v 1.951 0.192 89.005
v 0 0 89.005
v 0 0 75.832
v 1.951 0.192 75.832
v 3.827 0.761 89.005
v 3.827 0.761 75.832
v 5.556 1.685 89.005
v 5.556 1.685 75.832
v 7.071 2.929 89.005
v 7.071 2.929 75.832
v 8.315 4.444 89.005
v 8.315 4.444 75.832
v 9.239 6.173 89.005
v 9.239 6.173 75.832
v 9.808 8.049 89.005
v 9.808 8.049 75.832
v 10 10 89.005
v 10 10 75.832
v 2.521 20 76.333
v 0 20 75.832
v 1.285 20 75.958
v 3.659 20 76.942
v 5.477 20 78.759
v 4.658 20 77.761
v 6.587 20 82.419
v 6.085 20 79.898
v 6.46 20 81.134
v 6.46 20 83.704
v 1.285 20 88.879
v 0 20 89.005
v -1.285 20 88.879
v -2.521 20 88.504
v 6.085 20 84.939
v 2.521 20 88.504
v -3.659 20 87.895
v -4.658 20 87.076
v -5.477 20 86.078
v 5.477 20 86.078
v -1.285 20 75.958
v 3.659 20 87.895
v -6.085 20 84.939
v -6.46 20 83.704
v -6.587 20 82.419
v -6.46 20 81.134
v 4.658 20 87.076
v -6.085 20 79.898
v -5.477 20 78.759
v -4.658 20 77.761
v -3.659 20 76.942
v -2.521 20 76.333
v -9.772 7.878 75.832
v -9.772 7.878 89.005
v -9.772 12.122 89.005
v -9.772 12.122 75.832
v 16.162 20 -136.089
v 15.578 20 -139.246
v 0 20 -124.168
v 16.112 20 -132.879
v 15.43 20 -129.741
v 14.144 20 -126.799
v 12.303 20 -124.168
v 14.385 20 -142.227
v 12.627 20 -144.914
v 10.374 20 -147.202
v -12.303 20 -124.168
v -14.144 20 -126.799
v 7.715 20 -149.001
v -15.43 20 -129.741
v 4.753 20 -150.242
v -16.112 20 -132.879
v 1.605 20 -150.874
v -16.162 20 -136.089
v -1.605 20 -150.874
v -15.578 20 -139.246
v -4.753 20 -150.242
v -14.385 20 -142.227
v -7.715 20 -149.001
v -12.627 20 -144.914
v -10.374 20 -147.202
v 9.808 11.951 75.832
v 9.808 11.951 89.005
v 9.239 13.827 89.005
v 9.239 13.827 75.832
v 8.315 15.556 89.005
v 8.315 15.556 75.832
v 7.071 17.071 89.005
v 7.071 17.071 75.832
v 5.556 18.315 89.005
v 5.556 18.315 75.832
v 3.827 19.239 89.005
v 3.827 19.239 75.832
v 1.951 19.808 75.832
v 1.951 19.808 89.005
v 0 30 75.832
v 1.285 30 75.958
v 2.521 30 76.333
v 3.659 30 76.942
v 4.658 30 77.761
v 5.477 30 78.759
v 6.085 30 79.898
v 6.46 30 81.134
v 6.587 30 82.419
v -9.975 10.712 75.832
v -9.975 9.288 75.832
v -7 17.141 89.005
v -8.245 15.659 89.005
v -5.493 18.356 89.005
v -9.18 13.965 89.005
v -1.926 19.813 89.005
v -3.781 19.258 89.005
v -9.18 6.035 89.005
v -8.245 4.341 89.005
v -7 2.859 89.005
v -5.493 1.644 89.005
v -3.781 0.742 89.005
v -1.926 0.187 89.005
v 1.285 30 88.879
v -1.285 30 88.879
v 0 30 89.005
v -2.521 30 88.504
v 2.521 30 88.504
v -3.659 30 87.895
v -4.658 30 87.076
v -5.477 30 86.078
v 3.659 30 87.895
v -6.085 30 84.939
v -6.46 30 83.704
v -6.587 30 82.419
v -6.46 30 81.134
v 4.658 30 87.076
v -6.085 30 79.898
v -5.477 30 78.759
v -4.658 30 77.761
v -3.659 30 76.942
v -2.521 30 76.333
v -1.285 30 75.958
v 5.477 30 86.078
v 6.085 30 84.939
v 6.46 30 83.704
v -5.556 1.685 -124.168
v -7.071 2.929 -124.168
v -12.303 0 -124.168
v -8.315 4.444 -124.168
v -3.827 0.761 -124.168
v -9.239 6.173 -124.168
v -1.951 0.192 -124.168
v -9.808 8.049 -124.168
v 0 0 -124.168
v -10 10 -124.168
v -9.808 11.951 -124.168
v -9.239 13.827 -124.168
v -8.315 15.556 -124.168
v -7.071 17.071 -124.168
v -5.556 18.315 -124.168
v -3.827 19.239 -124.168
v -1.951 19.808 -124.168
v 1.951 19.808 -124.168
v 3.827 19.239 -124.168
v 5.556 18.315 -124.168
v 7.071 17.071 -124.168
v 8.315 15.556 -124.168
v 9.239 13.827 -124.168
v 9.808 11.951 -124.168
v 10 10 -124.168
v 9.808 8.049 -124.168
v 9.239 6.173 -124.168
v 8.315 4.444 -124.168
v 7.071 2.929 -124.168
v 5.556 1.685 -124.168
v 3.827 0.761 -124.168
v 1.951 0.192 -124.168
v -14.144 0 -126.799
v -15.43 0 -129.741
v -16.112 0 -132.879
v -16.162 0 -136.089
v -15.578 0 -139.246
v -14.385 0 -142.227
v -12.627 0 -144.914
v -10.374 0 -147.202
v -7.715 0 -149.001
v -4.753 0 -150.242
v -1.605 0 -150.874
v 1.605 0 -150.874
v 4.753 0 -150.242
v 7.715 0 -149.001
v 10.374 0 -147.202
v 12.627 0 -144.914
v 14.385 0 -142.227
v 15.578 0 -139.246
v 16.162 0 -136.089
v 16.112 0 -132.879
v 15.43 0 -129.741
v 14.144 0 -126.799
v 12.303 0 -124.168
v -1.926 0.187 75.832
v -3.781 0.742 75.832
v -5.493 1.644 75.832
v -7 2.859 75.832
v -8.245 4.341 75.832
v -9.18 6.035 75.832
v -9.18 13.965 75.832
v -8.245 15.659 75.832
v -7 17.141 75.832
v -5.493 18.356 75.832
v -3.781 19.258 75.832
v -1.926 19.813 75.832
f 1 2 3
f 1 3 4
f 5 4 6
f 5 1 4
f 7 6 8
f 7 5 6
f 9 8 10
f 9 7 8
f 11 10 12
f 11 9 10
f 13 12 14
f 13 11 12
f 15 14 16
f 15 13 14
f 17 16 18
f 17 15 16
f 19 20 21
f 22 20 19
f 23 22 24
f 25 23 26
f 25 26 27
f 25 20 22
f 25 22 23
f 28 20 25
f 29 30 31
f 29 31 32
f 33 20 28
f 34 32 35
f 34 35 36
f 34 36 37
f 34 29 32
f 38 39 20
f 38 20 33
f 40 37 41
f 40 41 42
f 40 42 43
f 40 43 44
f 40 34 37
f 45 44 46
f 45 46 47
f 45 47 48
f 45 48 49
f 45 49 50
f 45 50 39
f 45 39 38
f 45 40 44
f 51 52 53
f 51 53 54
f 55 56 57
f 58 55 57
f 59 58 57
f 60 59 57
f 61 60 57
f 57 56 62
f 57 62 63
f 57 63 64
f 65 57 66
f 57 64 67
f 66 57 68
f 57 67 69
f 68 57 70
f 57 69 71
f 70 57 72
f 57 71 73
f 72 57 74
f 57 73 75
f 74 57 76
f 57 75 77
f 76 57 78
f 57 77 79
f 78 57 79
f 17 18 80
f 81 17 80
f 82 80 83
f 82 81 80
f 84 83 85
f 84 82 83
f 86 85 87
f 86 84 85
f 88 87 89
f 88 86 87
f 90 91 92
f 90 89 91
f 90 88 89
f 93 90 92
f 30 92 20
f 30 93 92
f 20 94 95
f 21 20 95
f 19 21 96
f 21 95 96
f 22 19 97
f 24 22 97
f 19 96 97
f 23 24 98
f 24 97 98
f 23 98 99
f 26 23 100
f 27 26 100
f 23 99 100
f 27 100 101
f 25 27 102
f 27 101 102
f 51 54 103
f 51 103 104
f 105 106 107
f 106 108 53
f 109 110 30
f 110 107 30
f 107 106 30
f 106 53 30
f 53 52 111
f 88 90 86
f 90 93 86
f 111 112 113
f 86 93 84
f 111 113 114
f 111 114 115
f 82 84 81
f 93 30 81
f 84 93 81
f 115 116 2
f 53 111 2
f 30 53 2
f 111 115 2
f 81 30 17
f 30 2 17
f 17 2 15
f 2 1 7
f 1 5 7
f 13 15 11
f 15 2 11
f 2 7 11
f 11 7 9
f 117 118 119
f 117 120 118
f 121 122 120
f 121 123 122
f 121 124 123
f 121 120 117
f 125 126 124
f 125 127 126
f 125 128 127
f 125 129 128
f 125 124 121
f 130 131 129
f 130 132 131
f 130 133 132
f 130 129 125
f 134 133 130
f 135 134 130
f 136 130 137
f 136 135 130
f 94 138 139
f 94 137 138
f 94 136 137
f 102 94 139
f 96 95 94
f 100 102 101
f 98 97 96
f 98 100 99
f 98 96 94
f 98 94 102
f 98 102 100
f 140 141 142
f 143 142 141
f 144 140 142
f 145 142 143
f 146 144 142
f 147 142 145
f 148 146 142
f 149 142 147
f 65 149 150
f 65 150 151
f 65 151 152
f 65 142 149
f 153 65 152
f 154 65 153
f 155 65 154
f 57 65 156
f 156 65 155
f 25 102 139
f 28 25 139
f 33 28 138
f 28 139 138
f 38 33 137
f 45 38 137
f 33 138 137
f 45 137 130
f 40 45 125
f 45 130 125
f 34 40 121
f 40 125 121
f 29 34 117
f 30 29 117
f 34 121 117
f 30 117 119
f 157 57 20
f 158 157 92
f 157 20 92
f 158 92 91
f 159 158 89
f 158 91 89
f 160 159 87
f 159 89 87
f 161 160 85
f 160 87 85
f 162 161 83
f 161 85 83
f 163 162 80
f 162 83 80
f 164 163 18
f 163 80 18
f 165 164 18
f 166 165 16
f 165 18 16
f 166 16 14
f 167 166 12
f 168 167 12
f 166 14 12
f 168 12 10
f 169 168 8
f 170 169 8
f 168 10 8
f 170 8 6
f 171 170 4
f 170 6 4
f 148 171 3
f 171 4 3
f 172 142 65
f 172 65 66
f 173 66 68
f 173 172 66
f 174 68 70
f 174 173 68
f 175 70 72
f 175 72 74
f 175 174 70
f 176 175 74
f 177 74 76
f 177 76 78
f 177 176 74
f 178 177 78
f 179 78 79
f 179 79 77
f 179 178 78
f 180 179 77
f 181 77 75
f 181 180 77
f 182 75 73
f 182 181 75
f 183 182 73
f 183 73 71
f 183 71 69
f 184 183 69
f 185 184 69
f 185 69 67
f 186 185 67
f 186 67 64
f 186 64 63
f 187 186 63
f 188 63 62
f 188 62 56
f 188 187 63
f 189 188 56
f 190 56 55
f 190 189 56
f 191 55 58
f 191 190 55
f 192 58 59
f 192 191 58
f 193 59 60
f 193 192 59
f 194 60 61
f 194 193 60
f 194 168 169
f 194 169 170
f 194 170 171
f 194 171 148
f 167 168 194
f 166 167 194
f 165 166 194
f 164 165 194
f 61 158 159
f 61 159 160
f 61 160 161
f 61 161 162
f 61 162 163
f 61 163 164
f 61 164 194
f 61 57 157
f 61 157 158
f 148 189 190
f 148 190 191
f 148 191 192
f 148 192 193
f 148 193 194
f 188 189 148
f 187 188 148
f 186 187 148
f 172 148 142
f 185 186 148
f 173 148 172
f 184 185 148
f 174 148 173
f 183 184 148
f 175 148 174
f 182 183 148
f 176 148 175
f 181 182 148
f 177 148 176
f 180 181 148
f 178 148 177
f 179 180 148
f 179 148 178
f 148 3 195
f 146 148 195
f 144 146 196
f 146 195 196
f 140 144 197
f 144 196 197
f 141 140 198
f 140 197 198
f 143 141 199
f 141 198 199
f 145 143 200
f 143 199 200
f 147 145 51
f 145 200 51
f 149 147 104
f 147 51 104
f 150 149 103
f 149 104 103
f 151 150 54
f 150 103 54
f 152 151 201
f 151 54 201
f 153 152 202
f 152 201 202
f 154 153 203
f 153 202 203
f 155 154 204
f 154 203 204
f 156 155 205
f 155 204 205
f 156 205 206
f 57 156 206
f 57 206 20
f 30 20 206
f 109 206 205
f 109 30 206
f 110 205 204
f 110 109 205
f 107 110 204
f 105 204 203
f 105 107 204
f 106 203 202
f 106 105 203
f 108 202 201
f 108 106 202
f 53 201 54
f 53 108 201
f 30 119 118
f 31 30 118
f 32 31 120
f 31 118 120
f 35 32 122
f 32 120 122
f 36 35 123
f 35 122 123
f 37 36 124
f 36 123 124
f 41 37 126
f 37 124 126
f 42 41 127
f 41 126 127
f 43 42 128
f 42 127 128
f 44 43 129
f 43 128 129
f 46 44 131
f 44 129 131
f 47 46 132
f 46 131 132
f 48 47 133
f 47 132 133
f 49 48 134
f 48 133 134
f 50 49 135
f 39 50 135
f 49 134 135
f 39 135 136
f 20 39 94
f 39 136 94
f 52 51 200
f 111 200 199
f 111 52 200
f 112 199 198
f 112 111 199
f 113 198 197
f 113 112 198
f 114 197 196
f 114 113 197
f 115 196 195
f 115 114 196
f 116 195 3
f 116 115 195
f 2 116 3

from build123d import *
from build123d.topology import SkipClean

# Parameters (mm, degrees)
BOSS_EXTRUDE1_DEPTH = 20
CUT_EXTRUDE3_DEPTH  = 200
SKETCH5_W           = 19.772216907
SKETCH5_H           = 13.173491176
BOSS_EXTRUDE2_DEPTH = 30
CUT_EXTRUDE6_DEPTH  = 10
CUT_EXTRUDE8_START  = -34
CUT_EXTRUDE8_DEPTH  = 34


with BuildPart() as part:
    # Sketch1 → Boss-Extrude1 (new body)
    with BuildSketch(Plane(origin=(0, 0, 0), x_dir=(1, 0, 0), z_dir=(0, 1, 0))):
        with BuildLine():
            Line((12.303213462, -75.831786225), (-12.303213462, -75.831786225))
            Line((-12.303213462, -75.831786225), (-12.303213462, 124.168213775))
            ThreePointArc((-12.303213462, 124.168213775), (0, 150.953919879), (12.303213462, 124.168213775))
            Line((12.303213462, 124.168213775), (12.303213462, -75.831786225))
        make_face()
    extrude(amount=BOSS_EXTRUDE1_DEPTH)

    # Sketch3 → Cut-Extrude3 (cut)
    with BuildSketch(Plane.XY.offset(75.831786225)):
        with BuildLine():
            Line((5e-09, 0), (12.303213462, 0))
            Line((12.303213462, 0), (12.303213462, 20))
            Line((12.303213462, 20), (5.3e-08, 20))
            ThreePointArc((5.3e-08, 20), (10, 9.999999976), (5e-09, 0))
        make_face()
        with BuildLine():
            Line((-12.303213462, 0), (5e-09, 0))
            ThreePointArc((5e-09, 0), (-10, 10.000000024), (5.3e-08, 20))
            Line((5.3e-08, 20), (-12.303213462, 20))
            Line((-12.303213462, 20), (-12.303213462, 0))
        make_face()
    extrude(amount=-CUT_EXTRUDE3_DEPTH, mode=Mode.SUBTRACT)

    # Sketch5 → Boss-Extrude2 (add)
    with BuildSketch(Plane(origin=(0, 0, 0), x_dir=(1, 0, 0), z_dir=(0, 1, 0))):
        with Locations((0.113891546, -82.418531813)):
            Rectangle(SKETCH5_W, SKETCH5_H)
    extrude(amount=BOSS_EXTRUDE2_DEPTH)

    # Sketch6 → Cut-Extrude6 (cut)
    with BuildSketch(Plane(origin=(0, 30, 0), x_dir=(1, 0, 0), z_dir=(0, 1, 0))):
        with BuildLine():
            ThreePointArc((0, -89.005277401), (-6.586745588, -82.418531813), (0, -75.831786225))
            Line((0, -75.831786225), (-9.772216907, -75.831786225))
            Line((-9.772216907, -75.831786225), (-9.772216907, -89.005277401))
            Line((-9.772216907, -89.005277401), (0, -89.005277401))
        make_face()
        with BuildLine():
            Line((10, -75.831786225), (0, -75.831786225))
            ThreePointArc((0, -75.831786225), (6.586745588, -82.418531813), (0, -89.005277401))
            Line((0, -89.005277401), (10, -89.005277401))
            Line((10, -89.005277401), (10, -75.831786225))
        make_face()
    extrude(amount=-CUT_EXTRUDE6_DEPTH, mode=Mode.SUBTRACT)

    # Sketch9 → Cut-Extrude8 (cut)
    with SkipClean():  # the faces are left unmerged after this step: merging them gives an invalid solid
        with BuildSketch(Plane(origin=(0, 0, 75.831786225), x_dir=(-1, 0, 0), z_dir=(0, 0, -1)).offset(CUT_EXTRUDE8_START)):
            with BuildLine():
                Line((9.772216907, 12.12221034), (9.772216907, 20))
                Line((9.772216907, 20), (0, 20))
                ThreePointArc((0, 20), (6.276061528, 17.785309994), (9.772216907, 12.12221034))
            make_face()
            with BuildLine():
                ThreePointArc((9.772216907, 7.87778966), (6.276061528, 2.214690006), (0, 0))
                Line((0, 0), (9.772216907, 0))
                Line((9.772216907, 0), (9.772216907, 7.87778966))
            make_face()
            with BuildLine():
                ThreePointArc((0, 0), (-7.071067812, 2.928932188), (-10, 10))
                Line((-10, 10), (-10, 0))
                Line((-10, 0), (0, 0))
            make_face()
            with BuildLine():
                ThreePointArc((-10, 10), (-7.071067812, 17.071067812), (0, 20))
                Line((0, 20), (-10, 20))
                Line((-10, 20), (-10, 10))
            make_face()
        extrude(amount=CUT_EXTRUDE8_DEPTH, mode=Mode.SUBTRACT)


with BuildPart() as cut_extrude8_piece_1:
    # of the separate pieces the step leaves, piece 1, a body of its own (cut_extrude8_pieces)
    add(part.part.solids().sort_by_distance((-12.303213462, 0, -124.168213775))[0])


with BuildPart() as cut_extrude8_piece_2:
    # of the separate pieces the step leaves, piece 2, a body of its own (cut_extrude8_pieces)
    add(part.part.solids().sort_by_distance((0, 30, 89.005277401))[0])


solid = Compound([cut_extrude8_piece_1.part, cut_extrude8_piece_2.part])
